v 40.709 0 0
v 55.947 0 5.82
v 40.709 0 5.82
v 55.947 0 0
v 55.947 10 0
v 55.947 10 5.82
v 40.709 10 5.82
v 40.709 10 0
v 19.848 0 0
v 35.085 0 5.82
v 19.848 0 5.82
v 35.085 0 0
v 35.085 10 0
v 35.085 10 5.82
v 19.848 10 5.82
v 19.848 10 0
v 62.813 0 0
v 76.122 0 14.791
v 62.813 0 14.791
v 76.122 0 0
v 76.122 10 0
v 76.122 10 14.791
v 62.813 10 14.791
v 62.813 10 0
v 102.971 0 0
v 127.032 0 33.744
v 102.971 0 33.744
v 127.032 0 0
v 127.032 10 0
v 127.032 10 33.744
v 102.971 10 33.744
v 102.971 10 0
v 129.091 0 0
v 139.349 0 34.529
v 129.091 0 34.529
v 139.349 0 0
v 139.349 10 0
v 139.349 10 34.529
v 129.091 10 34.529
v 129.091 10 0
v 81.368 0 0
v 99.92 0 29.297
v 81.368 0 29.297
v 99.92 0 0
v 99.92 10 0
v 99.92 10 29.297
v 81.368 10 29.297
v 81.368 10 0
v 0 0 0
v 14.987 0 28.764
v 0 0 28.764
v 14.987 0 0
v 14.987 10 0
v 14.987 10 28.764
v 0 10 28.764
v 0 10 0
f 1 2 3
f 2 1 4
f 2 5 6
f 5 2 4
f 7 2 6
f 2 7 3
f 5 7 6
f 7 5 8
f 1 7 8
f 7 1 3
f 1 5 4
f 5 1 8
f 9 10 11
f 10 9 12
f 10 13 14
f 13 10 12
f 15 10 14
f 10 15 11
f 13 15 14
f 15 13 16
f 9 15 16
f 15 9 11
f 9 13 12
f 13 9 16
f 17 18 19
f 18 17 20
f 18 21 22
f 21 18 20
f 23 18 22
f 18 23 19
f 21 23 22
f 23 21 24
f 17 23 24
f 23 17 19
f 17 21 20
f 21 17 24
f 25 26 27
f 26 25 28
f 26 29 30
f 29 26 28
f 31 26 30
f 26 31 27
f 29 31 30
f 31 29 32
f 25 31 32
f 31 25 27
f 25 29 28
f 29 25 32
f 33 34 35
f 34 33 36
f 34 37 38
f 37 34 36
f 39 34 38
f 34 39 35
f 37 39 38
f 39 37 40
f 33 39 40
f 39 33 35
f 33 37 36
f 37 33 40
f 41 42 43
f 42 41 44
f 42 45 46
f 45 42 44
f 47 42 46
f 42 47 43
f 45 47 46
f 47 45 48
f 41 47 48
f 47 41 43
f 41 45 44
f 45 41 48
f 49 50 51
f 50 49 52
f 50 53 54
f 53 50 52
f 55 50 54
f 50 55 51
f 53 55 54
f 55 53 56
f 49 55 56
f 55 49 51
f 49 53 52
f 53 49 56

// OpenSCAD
// Module names are of the form poly_<inkscape-path-id>().  As a result,
// you can associate a polygon in this OpenSCAD program with the corresponding
// SVG element in the Inkscape document by looking for the XML element with
// the attribute id="inkscape-path-id".

// fudge value is used to ensure that subtracted solids are a tad taller
// in the z dimension than the polygon being subtracted from.  This helps
// keep the resulting .stl file manifold.
fudge = 0.1;

module poly_rect4573(h)
{
  union()
  {
    linear_extrude(height=h)
      polygon([[-28.965108,11.444307],[-13.727834,11.444307],[-13.727834,17.264553],[-28.965108,17.264553]]);
  }
}

module poly_rect4571(h)
{
  union()
  {
    linear_extrude(height=h)
      polygon([[-49.826440,11.444307],[-34.589166,11.444307],[-34.589166,17.264553],[-49.826440,17.264553]]);
  }
}

module poly_rect4581(h)
{
  union()
  {
    linear_extrude(height=h)
      polygon([[-6.861256,2.473834],[6.447796,2.473834],[6.447796,17.264556],[-6.861256,17.264556]]);
  }
}

module poly_rect4585(h)
{
  union()
  {
    linear_extrude(height=h)
      polygon([[33.296551,-16.479788],[57.357642,-16.479788],[57.357642,17.264560],[33.296551,17.264560]]);
  }
}

module poly_rect4587(h)
{
  union()
  {
    linear_extrude(height=h)
      polygon([[59.416649,-17.264560],[69.674534,-17.264560],[69.674534,17.264548],[59.416649,17.264548]]);
  }
}

module poly_rect4583(h)
{
  union()
  {
    linear_extrude(height=h)
      polygon([[11.693431,-12.032869],[30.245387,-12.032869],[30.245387,17.264552],[11.693431,17.264552]]);
  }
}

module poly_rect4567(h)
{
  union()
  {
    linear_extrude(height=h)
      polygon([[-69.674534,-11.499546],[-54.687470,-11.499546],[-54.687470,17.264558],[-69.674534,17.264558]]);
  }
}
module panel(){
  translate([69.674534,0,17.264558]) rotate([-90,0,0]) {
    poly_rect4573(10);
    poly_rect4571(10);
    poly_rect4581(10);
    poly_rect4585(10);
    poly_rect4587(10);
    poly_rect4583(10);
    poly_rect4567(10);
  }
}
panel();
